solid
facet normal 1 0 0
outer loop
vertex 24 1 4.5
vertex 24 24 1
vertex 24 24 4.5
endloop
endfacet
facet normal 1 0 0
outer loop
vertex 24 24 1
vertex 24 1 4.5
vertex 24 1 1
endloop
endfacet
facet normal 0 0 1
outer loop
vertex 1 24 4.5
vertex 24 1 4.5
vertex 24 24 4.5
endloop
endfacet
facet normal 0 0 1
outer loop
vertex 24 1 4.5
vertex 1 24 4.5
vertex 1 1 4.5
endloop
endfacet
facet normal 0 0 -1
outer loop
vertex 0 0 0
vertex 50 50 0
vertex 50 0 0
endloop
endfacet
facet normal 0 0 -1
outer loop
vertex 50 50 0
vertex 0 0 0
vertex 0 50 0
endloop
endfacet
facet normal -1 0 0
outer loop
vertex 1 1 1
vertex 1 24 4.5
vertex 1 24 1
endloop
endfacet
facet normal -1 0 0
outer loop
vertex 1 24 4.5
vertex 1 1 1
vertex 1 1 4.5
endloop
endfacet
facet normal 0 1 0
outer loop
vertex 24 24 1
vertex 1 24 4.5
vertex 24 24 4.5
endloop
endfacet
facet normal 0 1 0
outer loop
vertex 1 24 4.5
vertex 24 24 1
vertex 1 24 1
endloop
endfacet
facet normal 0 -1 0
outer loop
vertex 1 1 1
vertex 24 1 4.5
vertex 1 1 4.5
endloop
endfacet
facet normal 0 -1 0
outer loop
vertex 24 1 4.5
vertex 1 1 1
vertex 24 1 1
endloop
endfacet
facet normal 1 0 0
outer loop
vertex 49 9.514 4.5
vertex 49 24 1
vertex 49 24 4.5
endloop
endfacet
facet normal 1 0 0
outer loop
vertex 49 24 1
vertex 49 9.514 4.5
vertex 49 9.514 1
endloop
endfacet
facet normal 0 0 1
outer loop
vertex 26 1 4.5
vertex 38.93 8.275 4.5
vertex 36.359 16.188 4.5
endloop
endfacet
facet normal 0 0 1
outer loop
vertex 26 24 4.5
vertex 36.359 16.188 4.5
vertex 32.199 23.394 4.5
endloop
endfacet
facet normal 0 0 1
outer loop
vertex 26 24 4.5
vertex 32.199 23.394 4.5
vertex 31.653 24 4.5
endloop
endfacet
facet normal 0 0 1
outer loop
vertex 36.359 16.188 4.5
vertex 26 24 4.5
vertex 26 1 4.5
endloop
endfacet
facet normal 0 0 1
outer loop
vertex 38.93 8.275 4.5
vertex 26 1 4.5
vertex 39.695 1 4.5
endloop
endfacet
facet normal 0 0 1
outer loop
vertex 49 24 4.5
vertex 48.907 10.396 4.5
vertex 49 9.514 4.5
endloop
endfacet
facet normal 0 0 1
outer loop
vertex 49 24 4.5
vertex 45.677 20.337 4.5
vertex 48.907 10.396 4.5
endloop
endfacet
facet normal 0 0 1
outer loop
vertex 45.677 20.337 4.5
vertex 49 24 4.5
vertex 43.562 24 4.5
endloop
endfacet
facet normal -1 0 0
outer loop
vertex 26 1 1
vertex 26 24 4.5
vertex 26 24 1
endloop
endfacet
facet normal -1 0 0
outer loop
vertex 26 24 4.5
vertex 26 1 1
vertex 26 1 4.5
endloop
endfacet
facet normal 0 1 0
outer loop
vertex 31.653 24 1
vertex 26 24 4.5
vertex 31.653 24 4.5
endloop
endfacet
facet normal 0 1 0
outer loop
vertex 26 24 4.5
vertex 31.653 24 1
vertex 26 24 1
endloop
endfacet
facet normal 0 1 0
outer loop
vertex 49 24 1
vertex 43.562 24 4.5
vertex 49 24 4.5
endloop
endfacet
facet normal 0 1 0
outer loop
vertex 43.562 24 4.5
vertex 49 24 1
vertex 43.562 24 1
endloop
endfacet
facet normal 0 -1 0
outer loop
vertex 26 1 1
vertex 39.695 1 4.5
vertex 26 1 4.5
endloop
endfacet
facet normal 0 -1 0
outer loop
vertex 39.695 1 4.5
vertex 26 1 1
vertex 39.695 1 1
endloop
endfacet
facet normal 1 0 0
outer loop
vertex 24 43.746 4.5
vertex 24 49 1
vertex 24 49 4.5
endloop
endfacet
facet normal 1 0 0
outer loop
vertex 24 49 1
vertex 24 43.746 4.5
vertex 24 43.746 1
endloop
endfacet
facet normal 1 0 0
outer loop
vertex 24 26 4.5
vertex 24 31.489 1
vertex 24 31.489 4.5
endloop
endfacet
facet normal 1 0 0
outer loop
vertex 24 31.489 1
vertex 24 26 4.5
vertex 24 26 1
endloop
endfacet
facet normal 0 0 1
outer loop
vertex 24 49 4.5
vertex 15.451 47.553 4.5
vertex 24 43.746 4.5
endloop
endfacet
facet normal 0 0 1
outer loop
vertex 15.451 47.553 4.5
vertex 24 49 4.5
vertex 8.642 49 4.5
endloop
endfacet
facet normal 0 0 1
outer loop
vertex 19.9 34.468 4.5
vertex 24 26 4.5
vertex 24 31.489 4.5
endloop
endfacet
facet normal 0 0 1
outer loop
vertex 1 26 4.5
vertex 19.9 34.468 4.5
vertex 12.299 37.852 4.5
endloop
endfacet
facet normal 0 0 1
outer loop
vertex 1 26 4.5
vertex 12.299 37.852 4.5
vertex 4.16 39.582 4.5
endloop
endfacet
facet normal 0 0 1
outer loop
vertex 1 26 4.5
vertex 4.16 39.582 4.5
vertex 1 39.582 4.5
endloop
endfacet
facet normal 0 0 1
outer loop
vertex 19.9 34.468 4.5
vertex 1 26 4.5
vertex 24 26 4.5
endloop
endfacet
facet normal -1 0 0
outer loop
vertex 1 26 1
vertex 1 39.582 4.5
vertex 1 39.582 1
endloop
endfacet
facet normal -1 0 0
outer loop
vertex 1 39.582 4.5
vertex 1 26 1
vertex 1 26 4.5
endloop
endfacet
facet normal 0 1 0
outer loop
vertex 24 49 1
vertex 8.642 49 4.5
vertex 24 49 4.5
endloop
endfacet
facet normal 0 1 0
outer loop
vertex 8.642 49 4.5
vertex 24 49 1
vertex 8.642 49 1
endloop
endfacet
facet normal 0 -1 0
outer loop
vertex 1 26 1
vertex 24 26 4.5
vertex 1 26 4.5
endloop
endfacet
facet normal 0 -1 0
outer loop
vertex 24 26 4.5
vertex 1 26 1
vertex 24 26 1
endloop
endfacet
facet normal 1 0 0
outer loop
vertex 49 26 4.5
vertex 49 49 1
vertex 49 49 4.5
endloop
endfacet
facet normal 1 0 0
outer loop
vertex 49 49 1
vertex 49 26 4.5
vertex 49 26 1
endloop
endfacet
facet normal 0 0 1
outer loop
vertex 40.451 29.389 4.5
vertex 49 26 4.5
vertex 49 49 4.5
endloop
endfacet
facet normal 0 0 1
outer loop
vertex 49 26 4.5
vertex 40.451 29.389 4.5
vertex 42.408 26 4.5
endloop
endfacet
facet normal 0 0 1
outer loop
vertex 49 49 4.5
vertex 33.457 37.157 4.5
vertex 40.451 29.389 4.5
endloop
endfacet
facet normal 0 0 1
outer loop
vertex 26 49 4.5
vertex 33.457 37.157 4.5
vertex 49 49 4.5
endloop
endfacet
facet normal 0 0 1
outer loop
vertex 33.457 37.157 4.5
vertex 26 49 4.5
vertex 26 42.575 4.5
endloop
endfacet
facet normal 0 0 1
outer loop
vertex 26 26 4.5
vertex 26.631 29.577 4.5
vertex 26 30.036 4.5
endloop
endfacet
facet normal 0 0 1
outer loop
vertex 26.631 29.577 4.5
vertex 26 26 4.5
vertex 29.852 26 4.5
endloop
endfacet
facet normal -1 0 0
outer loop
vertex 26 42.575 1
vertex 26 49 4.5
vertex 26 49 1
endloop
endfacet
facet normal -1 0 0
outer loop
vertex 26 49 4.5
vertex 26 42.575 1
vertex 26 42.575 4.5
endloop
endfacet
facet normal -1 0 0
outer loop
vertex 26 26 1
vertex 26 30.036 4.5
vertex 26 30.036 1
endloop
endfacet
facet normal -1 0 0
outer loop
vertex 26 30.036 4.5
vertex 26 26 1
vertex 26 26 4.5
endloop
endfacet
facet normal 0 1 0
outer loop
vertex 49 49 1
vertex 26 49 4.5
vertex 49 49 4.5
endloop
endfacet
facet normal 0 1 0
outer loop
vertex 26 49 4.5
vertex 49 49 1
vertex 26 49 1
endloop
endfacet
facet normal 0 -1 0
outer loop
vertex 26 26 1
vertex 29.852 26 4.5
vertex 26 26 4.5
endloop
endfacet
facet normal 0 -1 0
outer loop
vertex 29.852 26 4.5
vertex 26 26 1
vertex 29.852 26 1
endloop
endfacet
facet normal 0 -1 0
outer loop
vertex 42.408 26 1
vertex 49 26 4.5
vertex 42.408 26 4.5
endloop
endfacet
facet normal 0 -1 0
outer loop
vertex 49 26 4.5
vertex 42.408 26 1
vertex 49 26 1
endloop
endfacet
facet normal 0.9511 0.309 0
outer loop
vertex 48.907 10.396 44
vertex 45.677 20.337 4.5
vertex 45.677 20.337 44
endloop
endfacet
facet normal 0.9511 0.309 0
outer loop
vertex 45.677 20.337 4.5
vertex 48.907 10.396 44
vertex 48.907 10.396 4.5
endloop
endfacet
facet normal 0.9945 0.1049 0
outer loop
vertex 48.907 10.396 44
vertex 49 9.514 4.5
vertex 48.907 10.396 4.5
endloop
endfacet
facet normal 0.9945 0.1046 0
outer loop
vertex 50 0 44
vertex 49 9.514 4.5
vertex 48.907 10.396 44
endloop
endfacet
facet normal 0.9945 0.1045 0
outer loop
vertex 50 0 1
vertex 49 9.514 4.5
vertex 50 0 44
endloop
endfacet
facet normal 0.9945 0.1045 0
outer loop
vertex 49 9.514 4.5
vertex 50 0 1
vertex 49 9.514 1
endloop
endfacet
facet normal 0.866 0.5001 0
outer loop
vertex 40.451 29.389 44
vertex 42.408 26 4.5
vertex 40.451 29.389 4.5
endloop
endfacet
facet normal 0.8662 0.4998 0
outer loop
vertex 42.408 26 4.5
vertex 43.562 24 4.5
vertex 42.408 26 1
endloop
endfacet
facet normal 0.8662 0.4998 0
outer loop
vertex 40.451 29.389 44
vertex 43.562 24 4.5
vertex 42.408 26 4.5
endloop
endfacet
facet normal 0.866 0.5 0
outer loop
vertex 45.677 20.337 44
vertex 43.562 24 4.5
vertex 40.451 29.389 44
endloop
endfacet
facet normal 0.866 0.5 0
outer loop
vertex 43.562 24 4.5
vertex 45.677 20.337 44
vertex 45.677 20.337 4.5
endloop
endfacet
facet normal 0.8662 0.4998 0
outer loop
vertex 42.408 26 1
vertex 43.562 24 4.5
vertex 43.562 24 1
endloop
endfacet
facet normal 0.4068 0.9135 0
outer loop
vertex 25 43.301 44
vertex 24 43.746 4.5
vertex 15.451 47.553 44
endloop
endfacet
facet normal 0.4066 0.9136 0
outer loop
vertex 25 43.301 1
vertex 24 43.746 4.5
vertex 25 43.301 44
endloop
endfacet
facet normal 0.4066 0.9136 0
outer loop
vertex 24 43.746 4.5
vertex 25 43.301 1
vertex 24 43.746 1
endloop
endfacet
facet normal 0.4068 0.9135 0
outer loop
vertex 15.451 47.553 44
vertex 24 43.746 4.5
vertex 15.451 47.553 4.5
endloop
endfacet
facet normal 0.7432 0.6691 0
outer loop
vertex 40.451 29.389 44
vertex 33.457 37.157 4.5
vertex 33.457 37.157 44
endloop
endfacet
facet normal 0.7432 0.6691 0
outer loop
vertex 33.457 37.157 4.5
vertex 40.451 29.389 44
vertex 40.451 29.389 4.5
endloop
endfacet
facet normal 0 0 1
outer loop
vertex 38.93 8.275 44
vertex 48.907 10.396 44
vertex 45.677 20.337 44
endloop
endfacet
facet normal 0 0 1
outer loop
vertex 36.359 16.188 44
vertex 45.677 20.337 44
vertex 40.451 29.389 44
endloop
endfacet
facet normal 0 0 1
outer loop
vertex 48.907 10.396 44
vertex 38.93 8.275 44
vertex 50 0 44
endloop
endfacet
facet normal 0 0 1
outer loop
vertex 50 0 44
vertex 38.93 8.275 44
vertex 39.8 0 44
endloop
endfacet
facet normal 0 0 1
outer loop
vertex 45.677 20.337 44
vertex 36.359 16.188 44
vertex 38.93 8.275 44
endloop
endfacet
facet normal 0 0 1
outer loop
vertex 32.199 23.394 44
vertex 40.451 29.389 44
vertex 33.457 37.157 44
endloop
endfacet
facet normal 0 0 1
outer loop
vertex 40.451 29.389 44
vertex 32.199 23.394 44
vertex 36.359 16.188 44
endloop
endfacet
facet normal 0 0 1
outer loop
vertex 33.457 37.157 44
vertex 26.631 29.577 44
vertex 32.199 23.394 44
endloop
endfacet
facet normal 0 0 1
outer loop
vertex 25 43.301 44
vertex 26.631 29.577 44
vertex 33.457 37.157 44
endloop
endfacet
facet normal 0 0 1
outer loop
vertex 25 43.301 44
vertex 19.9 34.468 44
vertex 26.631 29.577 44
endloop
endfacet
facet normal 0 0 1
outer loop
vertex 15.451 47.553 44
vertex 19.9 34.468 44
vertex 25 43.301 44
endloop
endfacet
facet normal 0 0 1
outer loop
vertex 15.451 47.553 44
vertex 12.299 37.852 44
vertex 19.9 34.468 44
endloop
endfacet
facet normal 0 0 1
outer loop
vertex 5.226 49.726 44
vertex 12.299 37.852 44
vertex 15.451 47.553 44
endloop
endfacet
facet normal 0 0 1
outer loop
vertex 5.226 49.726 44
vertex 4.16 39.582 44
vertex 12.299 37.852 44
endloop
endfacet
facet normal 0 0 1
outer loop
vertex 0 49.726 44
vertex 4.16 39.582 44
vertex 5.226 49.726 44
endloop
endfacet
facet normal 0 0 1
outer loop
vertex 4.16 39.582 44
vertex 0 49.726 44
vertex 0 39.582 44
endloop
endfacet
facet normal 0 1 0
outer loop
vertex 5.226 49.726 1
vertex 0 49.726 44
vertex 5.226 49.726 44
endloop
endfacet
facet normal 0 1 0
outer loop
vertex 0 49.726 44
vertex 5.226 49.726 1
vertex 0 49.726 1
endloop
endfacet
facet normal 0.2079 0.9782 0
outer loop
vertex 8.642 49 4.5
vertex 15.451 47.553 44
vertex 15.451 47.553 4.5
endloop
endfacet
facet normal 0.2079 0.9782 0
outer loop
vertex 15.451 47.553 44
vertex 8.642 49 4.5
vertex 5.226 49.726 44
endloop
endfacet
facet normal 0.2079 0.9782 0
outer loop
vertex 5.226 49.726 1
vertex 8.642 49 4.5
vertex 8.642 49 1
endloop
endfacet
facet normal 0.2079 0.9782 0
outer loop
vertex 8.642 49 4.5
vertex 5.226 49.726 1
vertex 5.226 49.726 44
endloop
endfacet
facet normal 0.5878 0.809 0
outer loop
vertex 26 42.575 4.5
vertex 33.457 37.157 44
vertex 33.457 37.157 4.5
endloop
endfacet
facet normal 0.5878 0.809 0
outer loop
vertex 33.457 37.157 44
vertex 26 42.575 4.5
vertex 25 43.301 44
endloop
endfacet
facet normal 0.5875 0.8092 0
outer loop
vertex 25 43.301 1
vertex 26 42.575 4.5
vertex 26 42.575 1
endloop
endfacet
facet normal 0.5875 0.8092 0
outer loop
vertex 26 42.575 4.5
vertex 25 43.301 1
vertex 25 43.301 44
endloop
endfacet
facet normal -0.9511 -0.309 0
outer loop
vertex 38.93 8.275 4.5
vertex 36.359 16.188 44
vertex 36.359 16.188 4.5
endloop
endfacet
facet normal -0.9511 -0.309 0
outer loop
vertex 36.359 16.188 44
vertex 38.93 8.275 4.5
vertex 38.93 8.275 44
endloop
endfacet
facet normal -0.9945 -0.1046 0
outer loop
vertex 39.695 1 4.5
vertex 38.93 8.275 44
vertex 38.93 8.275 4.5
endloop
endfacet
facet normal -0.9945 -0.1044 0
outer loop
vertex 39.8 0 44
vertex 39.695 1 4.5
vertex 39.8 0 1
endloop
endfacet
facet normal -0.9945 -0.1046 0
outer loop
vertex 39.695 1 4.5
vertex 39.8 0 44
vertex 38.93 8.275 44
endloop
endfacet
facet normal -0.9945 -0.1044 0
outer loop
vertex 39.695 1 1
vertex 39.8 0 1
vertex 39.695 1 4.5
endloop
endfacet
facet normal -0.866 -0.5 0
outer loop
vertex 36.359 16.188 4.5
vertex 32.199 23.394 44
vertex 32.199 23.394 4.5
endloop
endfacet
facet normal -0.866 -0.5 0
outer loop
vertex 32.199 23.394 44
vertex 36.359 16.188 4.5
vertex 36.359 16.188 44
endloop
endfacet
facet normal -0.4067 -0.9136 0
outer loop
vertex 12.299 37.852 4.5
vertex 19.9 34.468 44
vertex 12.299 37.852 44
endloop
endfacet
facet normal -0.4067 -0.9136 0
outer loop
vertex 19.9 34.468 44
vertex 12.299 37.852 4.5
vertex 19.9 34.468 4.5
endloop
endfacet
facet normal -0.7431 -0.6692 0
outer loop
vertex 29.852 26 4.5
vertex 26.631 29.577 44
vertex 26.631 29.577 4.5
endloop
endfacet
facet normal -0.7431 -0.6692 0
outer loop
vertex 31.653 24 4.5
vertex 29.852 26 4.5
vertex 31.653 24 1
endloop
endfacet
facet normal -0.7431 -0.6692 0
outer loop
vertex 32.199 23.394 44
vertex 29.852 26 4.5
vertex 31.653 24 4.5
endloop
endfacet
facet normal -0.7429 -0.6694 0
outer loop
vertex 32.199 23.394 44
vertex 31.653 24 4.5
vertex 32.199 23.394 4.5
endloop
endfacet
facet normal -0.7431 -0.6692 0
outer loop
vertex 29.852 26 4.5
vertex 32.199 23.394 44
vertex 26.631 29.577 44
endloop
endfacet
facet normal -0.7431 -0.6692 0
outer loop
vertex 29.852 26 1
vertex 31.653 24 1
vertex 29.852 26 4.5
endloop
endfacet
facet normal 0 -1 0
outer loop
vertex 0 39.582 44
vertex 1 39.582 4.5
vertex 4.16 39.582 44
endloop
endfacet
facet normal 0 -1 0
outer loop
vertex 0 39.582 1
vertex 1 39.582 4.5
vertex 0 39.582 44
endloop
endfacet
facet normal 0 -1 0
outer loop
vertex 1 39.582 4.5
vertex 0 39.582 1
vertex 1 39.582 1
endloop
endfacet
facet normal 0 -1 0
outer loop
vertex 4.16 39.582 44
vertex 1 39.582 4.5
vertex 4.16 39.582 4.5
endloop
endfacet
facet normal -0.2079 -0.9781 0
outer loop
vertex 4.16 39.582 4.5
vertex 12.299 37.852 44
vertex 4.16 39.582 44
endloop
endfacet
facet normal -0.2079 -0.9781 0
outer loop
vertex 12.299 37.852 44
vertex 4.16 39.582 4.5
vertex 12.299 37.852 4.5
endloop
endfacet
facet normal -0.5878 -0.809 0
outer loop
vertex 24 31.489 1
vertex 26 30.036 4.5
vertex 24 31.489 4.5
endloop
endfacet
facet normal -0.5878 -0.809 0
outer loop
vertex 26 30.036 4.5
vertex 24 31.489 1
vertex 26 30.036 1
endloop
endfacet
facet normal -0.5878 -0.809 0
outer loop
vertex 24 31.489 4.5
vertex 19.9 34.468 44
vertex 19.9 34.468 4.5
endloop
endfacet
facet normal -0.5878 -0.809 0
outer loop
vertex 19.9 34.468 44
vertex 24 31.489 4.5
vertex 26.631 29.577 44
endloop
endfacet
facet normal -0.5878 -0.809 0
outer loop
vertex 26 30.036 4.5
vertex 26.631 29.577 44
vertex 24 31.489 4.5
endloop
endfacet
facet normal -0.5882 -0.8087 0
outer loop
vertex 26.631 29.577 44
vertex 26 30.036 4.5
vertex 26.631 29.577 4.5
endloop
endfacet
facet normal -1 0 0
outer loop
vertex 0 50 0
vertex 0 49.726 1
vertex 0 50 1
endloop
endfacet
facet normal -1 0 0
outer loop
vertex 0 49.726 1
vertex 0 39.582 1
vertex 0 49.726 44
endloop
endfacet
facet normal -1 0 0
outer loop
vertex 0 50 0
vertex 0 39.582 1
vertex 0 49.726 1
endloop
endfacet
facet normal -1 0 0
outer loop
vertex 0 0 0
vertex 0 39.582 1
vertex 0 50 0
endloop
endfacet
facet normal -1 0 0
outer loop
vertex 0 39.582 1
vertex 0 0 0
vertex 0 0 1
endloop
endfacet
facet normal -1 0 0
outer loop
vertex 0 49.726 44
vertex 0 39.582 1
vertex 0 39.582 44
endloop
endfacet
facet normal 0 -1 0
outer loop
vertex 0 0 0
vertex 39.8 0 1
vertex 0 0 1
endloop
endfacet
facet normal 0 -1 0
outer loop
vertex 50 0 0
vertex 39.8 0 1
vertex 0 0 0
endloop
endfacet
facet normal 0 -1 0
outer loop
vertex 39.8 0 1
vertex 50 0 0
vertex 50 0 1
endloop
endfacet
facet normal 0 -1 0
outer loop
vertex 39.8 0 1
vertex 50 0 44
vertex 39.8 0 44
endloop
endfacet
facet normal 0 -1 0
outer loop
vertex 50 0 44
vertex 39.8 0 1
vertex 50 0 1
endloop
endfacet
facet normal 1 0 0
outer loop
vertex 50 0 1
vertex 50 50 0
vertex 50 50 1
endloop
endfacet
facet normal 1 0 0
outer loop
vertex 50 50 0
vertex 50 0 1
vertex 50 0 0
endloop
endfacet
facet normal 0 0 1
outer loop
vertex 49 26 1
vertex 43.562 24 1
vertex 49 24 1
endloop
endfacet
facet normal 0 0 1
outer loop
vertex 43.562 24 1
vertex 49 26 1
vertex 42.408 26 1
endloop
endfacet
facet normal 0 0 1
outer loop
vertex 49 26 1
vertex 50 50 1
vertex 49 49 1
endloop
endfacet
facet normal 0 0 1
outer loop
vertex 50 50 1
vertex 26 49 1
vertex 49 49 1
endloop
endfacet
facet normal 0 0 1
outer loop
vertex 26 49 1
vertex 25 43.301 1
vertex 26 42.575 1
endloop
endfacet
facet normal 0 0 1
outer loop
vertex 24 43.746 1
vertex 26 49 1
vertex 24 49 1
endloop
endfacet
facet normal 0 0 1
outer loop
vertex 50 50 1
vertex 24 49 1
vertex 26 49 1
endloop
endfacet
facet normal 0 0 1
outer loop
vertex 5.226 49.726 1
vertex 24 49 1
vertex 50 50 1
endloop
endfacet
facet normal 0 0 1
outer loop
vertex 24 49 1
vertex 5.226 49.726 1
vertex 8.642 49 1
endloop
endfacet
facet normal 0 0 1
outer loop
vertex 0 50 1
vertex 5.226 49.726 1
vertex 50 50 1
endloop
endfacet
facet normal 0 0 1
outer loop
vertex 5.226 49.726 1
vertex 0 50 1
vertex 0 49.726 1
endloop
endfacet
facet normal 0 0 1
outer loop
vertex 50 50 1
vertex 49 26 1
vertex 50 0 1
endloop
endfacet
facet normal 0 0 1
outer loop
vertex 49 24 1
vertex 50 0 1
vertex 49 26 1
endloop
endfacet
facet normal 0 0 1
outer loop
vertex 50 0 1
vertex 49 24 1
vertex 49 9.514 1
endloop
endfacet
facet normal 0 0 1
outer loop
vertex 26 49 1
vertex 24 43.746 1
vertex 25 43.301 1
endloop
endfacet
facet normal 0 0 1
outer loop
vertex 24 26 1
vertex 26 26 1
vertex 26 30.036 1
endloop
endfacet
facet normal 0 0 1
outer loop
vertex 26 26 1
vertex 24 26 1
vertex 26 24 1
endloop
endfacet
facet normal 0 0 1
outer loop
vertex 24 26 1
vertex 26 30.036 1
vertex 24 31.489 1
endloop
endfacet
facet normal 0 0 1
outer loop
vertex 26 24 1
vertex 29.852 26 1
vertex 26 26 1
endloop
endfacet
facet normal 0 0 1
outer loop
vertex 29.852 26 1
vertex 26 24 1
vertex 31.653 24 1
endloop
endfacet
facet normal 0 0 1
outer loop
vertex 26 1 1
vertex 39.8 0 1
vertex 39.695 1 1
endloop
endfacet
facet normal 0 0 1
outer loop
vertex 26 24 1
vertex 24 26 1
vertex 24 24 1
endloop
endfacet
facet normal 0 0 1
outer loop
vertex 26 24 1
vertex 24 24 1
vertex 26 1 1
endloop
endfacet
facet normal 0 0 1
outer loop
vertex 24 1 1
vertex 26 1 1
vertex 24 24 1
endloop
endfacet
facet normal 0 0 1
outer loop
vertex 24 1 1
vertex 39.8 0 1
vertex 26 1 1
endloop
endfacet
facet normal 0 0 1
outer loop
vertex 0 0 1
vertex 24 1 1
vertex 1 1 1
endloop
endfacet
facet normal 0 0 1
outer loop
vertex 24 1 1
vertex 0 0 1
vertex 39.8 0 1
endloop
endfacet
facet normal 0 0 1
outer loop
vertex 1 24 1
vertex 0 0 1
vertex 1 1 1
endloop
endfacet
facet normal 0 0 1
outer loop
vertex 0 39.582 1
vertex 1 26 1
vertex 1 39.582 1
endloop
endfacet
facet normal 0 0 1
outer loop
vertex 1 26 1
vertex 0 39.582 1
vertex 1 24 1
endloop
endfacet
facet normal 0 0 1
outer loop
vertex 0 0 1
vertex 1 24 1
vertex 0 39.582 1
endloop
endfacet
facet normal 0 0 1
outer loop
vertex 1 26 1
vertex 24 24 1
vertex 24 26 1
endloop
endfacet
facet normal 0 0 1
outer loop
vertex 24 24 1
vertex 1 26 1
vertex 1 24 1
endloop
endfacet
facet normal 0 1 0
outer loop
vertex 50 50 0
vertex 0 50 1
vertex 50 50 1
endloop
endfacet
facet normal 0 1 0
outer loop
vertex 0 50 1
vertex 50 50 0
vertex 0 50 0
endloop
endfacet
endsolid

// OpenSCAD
//translate([0,0,0]) color("LightGray") square([25,25],false);
//translate([25,0,0]) color("LightGray") square([25,25],false);
//translate([0,25,0]) color("LightGray") square([25,25],false);
//translate([25,25,0]) color("LightGray") square([25,25],false);

scale([2,2,2]) {
    //translate([0,50,0]) color("Gray") square([50,12.5],false);
    //translate([50,0,0]) color("Gray") square([12.5,50],false);
}

color("LightGray") {
    translate([1,1,0]) cube([23,23,4.5]);
    translate([25+1,1,0]) cube([23,23,4.5]);
    translate([1,25+1,0]) cube([23,23,4.5]);
    translate([25+1,25+1,0]) cube([23,23,4.5]);
}
color("Grey") {
    cube([50,50,1]);
    intersection() {
        difference() {
            cylinder(50-6,50,50);
            translate([0,0,-1]) cylinder(52,50-10.2,50-10.2);
        }
        cube([50,50,50]);
    }
}
